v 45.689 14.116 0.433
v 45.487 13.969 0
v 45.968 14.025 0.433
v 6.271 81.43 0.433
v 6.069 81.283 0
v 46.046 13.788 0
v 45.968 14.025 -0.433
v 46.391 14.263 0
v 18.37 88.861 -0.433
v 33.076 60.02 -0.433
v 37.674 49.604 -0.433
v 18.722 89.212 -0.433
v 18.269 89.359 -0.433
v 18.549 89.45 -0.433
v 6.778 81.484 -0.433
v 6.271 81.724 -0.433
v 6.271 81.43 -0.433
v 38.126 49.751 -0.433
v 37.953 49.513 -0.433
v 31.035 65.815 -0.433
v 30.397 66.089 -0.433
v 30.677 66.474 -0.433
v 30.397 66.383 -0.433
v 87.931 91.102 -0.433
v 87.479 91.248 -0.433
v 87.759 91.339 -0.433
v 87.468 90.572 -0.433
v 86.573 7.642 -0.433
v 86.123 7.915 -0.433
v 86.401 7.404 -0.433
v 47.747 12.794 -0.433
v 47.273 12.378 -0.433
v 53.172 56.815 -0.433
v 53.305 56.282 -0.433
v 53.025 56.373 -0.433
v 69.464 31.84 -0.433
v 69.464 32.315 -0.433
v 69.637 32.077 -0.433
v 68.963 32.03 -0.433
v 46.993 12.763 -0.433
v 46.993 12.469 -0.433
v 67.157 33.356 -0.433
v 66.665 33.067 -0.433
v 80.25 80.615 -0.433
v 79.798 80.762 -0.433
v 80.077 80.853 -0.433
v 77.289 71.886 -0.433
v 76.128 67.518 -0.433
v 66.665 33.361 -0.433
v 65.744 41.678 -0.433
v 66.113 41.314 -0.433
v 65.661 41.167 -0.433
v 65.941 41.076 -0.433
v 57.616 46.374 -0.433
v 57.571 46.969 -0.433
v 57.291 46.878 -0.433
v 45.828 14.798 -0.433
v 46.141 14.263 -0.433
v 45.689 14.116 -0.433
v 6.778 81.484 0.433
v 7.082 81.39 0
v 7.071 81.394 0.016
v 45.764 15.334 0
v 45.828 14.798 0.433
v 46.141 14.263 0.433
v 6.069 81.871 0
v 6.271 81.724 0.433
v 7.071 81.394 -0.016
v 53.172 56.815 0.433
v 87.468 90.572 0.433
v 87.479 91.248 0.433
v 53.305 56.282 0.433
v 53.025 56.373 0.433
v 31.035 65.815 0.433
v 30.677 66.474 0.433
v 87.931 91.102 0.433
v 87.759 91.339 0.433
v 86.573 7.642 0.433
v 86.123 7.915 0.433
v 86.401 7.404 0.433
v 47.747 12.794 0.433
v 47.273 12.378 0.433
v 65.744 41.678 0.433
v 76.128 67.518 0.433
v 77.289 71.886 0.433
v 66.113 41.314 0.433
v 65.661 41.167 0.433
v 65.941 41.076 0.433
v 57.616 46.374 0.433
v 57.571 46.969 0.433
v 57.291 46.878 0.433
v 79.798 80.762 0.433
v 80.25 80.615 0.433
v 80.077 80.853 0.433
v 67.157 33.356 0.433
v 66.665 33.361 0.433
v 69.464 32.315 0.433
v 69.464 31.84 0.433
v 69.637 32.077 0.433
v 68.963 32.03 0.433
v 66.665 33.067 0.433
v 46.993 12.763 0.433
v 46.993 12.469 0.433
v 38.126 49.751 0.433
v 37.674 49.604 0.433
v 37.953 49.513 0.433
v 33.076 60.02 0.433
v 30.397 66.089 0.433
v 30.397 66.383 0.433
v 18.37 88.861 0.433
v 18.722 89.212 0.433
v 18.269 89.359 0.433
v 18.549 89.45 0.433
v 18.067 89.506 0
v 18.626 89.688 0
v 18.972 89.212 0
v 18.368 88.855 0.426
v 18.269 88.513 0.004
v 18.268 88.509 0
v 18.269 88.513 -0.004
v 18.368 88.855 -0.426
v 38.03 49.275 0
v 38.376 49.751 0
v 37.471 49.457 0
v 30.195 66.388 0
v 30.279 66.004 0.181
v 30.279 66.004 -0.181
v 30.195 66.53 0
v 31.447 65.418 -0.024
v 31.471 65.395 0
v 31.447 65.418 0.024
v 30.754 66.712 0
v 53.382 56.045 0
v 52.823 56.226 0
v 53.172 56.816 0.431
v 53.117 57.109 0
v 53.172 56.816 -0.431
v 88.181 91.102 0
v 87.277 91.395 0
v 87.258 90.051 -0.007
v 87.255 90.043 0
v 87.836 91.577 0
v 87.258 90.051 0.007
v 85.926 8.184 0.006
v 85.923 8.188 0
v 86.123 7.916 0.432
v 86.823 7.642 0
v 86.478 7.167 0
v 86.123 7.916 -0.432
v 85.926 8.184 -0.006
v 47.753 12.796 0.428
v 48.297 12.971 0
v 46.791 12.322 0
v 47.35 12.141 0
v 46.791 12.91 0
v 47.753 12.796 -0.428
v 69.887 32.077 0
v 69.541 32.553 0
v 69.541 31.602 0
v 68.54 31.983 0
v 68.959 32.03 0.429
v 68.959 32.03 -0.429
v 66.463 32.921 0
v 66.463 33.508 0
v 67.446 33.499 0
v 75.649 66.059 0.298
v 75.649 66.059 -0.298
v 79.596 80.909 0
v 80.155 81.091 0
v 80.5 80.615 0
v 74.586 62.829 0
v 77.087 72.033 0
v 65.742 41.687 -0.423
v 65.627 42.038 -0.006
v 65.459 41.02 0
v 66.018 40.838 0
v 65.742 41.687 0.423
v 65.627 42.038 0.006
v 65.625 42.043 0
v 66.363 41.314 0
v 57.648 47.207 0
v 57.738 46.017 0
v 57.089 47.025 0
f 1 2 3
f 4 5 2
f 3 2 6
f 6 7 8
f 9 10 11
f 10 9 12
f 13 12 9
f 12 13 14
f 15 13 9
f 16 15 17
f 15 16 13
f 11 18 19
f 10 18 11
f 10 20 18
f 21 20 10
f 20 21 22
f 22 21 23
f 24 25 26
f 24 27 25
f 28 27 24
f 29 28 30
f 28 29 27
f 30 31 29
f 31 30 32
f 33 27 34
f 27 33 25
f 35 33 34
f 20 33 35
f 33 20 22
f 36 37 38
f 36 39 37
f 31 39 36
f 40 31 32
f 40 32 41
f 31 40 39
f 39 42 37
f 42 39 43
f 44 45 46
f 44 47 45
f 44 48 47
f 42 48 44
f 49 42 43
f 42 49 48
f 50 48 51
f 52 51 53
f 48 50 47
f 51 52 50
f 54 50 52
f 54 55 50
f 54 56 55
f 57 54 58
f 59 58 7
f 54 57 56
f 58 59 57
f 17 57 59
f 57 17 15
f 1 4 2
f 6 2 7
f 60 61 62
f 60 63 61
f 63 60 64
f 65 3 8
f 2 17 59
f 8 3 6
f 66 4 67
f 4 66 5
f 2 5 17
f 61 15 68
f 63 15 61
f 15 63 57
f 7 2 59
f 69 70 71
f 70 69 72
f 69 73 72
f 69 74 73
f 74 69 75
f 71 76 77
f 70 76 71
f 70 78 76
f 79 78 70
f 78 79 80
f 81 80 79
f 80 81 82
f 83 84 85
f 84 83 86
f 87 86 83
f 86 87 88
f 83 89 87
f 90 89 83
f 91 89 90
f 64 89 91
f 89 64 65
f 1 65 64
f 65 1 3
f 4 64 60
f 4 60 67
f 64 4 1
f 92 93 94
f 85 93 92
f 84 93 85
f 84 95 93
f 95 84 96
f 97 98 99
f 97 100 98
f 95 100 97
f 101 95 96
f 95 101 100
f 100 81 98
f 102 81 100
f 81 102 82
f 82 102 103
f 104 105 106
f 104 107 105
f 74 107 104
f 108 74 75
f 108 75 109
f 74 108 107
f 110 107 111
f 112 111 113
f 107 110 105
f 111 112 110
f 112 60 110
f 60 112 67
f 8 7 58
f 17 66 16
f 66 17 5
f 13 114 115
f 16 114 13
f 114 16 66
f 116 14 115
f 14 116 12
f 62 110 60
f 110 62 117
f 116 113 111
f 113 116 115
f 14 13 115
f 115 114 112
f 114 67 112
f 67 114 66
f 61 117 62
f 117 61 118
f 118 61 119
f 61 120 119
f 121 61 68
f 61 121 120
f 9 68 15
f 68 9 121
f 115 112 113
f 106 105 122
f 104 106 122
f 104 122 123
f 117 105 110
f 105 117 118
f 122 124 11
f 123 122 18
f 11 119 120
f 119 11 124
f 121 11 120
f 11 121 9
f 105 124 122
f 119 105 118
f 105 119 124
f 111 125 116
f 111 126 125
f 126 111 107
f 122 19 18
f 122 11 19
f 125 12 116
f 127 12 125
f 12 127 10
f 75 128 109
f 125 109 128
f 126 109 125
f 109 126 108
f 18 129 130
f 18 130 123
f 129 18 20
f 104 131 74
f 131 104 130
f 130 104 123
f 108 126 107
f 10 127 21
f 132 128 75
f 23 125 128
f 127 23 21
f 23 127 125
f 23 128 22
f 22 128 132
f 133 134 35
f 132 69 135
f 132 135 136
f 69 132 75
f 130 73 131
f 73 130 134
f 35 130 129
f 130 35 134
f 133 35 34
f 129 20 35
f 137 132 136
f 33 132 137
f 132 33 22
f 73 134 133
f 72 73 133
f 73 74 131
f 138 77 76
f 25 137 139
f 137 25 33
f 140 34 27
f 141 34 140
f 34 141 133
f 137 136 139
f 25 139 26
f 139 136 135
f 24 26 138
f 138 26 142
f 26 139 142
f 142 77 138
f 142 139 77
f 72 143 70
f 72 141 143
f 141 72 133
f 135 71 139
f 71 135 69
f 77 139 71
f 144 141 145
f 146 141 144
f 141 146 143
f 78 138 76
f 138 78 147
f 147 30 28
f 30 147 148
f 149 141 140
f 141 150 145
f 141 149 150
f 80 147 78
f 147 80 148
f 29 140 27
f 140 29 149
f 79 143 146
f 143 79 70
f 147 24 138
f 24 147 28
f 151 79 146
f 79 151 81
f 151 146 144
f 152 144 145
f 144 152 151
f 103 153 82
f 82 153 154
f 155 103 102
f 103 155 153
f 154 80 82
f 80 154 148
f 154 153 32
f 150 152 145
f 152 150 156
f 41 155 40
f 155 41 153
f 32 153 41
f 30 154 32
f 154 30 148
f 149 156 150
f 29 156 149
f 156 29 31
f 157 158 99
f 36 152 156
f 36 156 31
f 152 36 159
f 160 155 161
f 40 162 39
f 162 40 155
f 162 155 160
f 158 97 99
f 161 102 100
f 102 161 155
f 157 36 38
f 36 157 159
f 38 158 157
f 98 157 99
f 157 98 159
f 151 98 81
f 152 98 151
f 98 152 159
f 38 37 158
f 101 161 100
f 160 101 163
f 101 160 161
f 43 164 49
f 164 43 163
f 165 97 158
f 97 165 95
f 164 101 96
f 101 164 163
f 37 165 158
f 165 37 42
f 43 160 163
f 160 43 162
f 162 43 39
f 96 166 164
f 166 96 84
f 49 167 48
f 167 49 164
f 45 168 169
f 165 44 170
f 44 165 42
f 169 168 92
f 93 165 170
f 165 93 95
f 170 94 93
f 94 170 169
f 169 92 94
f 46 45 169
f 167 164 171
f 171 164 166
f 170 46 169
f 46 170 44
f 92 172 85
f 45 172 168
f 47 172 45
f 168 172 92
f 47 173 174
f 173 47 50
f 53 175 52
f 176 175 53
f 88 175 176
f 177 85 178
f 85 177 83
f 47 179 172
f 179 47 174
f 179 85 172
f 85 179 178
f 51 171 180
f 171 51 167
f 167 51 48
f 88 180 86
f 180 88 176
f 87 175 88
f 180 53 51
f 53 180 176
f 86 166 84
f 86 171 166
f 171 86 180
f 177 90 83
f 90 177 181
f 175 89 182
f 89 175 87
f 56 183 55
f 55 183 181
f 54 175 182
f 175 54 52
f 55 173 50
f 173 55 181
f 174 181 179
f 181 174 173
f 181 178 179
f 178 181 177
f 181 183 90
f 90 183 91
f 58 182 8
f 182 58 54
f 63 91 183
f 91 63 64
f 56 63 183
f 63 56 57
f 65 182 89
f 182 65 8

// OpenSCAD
p1=[0,0];
p2=[0, 100];
p3=[rnd(0,100),rnd(0,100)];
p4=[rnd(0,100),rnd(0,100)];
p6=[rnd(0,100),rnd(0,100)];
p7=[rnd(0,100),rnd(0,100)];
p8=[rnd(0,100),rnd(0,100)];
p5=[rnd(0,100),rnd(0,100)];
 
//
p=buildNIpolygon([  ],12);
r=[for(i=[0:len(p)-1])rnd(10)];
//p=brutebuild(12);
 polyline(p);

echo( p);
echo( r);

function brutebuild (c=10)= let (p=[for(i=[1:c] )[rnd(0,100),rnd(0,100)]])
selfintesect(p)?brutebuild(c):p;


function buildNIpolygon(pi,c=6,smooth=0.74)=
let(p=pi==[]?[[rnd(100),rnd(100)],[rnd(100),rnd(100)],[rnd(100),rnd(100)]]:pi)
c<=0?p:
let(np=concat([newpoint(p[0],p[last(p)])],p))
selfintesect(np)?buildNIpolygon(cycle(p,rnd(last(p))),c):buildNIpolygon(cycle(np,rnd(last(np))),c-1 );

function newpoint(a,b)=
//let(bi=rnd(),m=lerp(a,b,bi),mag=norm(a-b),n=ortho(un(a-b)) )m+n*(mag*min(bi,1-bi)*rnd(-1,1)*2)
[rnd(0,100),rnd(0,100)];

function ortho(v)=[v.y,-v.x];
function cycle(p,n=1)=[for(i=[0:len(p)-1]) p[wrap(i+n,len(p))]];

function selfintesect(p)=
let(lp1=len(p)-1,lp=lp1+1)
let(allp=
[for(i=[0:lp1])
let(allpi=[for(j=[i:i+lp1-1])
 
let(A=p[wrap(i,lp)])
let(B=p[wrap(i+1,lp)])
let(C=p[wrap(j,lp)])
let(D=p[wrap(j+1,lp)])
intersect(A,B,C,D)
 ]
//,err=echo(allpi)
)
allfalse(allpi)]

//,err=echo(allp)
)
 !alltrue(allp);
;


function  ccw(A,B,C)=
    (C.y-A.y) * (B.x-A.x) > (B.y-A.y) * (C.x-A.x);

function intersect(A,B,C,D)=
A==B||
C==D||
B==C||
B==D||
A==C||
A==D?false:
      ccw(A,C,D) != ccw(B,C,D) && ccw(A,B,C) != ccw(A,B,D);
function wrap(x,x_max=1,x_min=0) = (((x - x_min) % (x_max - x_min)) + (x_max - x_min)) % (x_max - x_min) + x_min;



function rnd(a = 1, b = 0, s = []) = 
  s == [] ? 
   (rands(min(a, b), max(   a, b), 1)[0]) 
  : 
   (rands(min(a, b), max(a, b), 1, s)[0])
  ; 
function lerp(start, end, bias) = (end * bias + start * (1 - bias));

function AvgThree(v1, v2, v3) = (v1 + v2 + v3) / 3;
function alltrue(a) =
let (b = [
  for (i = a) true]) a == b;
function allfalse(a) =
let (b = [
  for (i = a) false]) a == b;
 module polyline(p) {for(i=[0:max(0,len(p)-1)])line(p[i],p[wrap(i+1,len(p) )]);
}

module line(p1, p2 ,width=0.5) 
{
    hull() {
        translate(p1) sphere(width);
        translate(p2) sphere(width);
    }
}
 function last(i)=len(i)-1;
function un(v)=v/max(norm(v),1e-16);
